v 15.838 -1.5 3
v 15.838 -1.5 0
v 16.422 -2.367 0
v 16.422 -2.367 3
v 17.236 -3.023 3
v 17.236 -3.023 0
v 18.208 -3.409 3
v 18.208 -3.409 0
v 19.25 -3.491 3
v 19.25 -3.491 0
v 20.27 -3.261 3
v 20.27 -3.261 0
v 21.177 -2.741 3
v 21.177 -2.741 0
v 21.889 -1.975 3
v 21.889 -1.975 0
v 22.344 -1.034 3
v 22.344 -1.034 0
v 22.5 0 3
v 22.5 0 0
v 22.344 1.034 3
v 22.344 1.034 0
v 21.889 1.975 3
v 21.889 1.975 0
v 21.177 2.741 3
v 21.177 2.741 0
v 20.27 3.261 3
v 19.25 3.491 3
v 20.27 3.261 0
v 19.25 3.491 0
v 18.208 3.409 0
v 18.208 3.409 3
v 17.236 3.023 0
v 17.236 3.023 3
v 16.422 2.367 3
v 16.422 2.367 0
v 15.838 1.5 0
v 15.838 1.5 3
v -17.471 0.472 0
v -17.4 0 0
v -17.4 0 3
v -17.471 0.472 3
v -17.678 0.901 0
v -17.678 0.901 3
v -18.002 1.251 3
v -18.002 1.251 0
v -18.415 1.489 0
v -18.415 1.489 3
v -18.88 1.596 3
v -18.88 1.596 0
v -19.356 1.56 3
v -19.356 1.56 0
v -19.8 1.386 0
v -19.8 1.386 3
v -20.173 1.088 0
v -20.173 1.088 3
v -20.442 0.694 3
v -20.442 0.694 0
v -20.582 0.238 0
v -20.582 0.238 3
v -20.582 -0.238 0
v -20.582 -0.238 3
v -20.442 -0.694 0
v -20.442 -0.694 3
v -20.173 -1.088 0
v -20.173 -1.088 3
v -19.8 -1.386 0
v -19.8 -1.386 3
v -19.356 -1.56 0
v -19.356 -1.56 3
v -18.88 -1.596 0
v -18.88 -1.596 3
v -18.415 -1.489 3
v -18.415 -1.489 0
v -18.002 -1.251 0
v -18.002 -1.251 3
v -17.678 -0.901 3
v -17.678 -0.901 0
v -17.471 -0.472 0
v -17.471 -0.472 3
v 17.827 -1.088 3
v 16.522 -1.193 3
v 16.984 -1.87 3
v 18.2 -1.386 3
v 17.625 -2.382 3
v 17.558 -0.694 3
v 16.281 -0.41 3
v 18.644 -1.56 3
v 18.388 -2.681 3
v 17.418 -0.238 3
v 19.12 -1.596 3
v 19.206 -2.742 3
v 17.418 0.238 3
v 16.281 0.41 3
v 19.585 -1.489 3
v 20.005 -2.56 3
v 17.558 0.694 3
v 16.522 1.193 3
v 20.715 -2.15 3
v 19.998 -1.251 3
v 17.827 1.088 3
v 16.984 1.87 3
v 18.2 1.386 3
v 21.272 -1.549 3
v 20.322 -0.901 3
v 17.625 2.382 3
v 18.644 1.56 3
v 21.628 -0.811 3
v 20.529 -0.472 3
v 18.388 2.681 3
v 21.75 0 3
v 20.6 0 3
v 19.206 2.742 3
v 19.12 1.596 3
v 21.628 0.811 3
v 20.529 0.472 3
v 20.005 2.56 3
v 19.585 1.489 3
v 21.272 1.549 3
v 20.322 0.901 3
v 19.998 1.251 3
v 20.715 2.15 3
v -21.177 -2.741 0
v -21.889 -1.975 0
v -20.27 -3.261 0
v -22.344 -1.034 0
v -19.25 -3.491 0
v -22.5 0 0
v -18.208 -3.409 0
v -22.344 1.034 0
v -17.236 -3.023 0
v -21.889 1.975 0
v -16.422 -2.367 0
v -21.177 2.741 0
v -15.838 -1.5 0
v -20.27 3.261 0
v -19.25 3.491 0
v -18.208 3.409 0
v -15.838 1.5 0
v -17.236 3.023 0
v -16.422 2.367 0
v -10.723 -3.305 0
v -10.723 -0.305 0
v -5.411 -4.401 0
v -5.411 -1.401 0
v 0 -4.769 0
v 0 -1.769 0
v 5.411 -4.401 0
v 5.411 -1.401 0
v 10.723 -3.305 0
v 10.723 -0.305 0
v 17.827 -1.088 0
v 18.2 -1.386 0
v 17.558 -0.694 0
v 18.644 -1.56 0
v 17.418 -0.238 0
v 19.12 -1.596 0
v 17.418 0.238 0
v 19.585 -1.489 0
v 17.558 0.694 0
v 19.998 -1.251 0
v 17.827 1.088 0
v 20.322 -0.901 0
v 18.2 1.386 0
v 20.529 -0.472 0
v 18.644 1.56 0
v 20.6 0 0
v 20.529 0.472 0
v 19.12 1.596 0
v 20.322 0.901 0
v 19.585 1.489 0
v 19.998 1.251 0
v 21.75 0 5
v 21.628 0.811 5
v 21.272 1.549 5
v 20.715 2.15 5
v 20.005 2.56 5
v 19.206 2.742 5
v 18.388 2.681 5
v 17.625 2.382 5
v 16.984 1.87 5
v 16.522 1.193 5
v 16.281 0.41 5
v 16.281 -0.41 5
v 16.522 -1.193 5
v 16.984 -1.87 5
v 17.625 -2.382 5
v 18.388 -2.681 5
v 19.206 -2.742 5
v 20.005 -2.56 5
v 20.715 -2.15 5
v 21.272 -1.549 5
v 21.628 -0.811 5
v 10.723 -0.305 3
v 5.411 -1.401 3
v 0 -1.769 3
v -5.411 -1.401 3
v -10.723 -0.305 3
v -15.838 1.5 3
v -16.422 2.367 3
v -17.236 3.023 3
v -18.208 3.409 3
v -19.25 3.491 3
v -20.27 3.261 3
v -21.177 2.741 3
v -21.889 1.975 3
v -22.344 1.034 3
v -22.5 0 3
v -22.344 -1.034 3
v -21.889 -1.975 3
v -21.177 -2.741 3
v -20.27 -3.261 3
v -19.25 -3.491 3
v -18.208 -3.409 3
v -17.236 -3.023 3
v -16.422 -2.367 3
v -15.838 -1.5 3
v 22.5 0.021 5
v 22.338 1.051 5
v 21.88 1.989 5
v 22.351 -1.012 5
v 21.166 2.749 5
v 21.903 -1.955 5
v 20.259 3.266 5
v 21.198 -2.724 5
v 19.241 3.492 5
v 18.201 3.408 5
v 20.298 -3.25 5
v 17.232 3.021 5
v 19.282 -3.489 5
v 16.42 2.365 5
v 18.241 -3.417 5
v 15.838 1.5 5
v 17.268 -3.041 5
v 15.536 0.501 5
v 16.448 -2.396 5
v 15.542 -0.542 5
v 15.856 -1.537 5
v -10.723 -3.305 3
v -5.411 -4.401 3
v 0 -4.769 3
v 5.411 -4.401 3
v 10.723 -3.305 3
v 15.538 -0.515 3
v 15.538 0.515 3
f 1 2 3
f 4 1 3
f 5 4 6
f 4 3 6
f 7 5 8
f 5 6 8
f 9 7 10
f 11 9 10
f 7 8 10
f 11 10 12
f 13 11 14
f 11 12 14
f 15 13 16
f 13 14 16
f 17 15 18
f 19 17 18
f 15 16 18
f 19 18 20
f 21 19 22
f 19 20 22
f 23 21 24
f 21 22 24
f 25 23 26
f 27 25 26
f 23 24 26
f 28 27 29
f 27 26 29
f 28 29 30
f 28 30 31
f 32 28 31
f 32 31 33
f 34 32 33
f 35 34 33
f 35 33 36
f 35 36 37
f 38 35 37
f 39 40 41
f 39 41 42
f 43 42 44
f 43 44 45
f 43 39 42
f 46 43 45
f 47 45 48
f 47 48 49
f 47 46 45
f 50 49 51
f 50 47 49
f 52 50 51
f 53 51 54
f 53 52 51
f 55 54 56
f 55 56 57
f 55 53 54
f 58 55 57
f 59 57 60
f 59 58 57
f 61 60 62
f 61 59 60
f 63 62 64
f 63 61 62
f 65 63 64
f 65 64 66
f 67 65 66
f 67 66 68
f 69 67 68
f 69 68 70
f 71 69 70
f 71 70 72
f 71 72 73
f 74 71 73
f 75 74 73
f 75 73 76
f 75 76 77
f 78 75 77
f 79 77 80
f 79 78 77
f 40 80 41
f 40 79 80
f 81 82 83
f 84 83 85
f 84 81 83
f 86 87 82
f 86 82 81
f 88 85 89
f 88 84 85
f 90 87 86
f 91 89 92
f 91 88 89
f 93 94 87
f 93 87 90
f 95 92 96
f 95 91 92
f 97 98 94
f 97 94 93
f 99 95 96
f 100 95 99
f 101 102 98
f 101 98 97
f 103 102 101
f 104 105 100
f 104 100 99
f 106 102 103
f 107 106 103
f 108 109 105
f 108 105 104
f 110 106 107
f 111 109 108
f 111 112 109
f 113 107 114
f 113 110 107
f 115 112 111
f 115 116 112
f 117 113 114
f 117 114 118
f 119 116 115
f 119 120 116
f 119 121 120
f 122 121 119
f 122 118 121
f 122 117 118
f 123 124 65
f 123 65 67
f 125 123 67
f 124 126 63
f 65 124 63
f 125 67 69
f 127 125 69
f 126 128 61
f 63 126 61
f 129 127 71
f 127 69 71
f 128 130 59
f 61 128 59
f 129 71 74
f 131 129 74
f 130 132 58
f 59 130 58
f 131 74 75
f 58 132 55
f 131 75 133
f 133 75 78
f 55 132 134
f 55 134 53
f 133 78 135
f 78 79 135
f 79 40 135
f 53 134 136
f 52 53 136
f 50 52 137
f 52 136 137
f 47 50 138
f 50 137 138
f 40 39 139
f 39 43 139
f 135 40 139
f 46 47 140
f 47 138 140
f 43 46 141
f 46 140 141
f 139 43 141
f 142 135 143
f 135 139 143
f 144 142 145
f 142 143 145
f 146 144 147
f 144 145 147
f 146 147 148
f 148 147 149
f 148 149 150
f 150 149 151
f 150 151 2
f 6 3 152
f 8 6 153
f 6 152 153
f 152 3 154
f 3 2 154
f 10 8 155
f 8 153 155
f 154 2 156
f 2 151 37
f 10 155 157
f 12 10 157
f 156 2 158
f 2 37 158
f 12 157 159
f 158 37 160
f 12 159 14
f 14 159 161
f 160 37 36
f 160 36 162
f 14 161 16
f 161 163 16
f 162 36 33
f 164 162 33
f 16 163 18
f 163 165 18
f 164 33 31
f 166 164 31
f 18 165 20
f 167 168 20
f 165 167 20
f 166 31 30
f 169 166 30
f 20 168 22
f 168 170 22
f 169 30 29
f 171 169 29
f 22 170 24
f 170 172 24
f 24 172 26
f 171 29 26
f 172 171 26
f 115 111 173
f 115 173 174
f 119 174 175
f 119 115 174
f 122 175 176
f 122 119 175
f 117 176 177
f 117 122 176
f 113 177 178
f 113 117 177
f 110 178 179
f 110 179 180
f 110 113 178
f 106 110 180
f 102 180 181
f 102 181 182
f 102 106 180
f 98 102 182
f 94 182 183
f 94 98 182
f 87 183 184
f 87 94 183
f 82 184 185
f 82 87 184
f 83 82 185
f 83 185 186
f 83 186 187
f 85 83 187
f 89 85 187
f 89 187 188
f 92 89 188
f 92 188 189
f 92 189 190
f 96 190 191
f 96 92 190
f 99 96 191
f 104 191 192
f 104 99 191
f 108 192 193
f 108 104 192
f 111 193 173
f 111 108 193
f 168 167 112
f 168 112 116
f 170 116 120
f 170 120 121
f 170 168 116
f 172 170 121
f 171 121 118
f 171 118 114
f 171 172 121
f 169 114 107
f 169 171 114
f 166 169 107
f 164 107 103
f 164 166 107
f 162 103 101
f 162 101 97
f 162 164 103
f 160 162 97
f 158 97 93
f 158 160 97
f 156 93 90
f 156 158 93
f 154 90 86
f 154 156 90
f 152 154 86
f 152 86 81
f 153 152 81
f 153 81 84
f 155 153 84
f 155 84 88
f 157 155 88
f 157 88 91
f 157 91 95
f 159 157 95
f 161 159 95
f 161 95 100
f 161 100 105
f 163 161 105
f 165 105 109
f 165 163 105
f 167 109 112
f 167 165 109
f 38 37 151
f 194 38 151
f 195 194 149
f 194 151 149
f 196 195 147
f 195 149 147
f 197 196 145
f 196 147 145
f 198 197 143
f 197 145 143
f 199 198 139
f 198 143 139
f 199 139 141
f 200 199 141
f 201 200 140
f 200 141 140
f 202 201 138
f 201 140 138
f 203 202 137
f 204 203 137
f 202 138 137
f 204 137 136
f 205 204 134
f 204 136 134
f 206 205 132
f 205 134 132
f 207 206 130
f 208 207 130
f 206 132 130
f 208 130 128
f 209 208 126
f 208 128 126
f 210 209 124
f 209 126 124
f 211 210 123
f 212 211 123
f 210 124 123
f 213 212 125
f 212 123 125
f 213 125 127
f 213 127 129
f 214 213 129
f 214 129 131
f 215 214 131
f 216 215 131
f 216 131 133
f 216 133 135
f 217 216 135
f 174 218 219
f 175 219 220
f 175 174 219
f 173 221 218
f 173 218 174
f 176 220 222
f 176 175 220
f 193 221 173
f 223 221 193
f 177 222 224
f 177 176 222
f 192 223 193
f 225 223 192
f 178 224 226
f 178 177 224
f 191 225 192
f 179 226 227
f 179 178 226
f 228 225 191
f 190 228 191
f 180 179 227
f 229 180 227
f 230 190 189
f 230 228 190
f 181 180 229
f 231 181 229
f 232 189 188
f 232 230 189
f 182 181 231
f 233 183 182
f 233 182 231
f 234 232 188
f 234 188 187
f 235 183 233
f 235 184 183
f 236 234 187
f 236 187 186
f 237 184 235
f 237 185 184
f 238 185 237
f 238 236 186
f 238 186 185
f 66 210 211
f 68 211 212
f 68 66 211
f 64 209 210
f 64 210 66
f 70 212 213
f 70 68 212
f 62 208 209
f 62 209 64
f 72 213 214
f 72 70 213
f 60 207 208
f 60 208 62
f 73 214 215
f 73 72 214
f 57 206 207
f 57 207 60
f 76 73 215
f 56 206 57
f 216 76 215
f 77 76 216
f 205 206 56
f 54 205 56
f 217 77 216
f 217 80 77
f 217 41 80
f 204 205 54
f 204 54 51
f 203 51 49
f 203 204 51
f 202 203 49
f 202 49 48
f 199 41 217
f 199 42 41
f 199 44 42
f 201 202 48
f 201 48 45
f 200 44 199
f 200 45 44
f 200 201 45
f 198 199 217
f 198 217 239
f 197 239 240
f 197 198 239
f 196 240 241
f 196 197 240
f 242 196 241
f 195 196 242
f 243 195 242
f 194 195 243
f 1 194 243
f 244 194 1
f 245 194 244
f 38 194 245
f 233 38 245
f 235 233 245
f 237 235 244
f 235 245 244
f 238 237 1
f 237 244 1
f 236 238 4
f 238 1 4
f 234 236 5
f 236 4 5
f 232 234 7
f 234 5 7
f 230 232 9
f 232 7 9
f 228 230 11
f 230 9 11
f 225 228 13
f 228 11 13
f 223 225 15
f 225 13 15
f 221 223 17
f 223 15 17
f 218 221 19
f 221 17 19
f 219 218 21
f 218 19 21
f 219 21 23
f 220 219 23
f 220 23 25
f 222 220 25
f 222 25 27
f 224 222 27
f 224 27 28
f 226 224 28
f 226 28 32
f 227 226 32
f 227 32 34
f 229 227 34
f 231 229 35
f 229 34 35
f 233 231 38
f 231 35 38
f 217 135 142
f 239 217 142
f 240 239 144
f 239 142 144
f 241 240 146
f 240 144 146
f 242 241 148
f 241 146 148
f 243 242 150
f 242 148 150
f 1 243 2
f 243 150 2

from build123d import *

# Parameters (mm, degrees)
SKETCH2_R           = 1.6
BOSS_EXTRUDE1_DEPTH = 3
SKETCH3_R           = 3.5
SKETCH3_R_2         = 2.75
BOSS_EXTRUDE2_DEPTH = 2


with BuildPart() as part:
    # Sketch2 → Boss-Extrude1 (new body)
    with BuildSketch(Plane.XY):
        with BuildLine():
            ThreePointArc((-15.83772234, 1.5), (-22.5, 0), (-15.83772234, -1.5))
            ThreePointArc((-15.83772234, -1.5), (0, -4.768997412), (15.83772234, -1.5))
            ThreePointArc((15.83772234, -1.5), (22.5, 0), (15.83772234, 1.5))
            ThreePointArc((15.83772234, 1.5), (0, -1.768997412), (-15.83772234, 1.5))
        make_face()
        with Locations((-19, 0)):
            Circle(SKETCH2_R, mode=Mode.SUBTRACT)
        with Locations((19, 0)):
            Circle(SKETCH2_R, mode=Mode.SUBTRACT)
    extrude(amount=BOSS_EXTRUDE1_DEPTH)

    # Sketch3 → Boss-Extrude2 (add)
    with BuildSketch(Plane.XY.offset(3)):
        with Locations(Location((19, 0, 0), (0, 0, 154.623066475))):
            Circle(SKETCH3_R)
        with Locations((19, 0)):
            Circle(SKETCH3_R_2, mode=Mode.SUBTRACT)
    extrude(amount=BOSS_EXTRUDE2_DEPTH)


solid = part.part
